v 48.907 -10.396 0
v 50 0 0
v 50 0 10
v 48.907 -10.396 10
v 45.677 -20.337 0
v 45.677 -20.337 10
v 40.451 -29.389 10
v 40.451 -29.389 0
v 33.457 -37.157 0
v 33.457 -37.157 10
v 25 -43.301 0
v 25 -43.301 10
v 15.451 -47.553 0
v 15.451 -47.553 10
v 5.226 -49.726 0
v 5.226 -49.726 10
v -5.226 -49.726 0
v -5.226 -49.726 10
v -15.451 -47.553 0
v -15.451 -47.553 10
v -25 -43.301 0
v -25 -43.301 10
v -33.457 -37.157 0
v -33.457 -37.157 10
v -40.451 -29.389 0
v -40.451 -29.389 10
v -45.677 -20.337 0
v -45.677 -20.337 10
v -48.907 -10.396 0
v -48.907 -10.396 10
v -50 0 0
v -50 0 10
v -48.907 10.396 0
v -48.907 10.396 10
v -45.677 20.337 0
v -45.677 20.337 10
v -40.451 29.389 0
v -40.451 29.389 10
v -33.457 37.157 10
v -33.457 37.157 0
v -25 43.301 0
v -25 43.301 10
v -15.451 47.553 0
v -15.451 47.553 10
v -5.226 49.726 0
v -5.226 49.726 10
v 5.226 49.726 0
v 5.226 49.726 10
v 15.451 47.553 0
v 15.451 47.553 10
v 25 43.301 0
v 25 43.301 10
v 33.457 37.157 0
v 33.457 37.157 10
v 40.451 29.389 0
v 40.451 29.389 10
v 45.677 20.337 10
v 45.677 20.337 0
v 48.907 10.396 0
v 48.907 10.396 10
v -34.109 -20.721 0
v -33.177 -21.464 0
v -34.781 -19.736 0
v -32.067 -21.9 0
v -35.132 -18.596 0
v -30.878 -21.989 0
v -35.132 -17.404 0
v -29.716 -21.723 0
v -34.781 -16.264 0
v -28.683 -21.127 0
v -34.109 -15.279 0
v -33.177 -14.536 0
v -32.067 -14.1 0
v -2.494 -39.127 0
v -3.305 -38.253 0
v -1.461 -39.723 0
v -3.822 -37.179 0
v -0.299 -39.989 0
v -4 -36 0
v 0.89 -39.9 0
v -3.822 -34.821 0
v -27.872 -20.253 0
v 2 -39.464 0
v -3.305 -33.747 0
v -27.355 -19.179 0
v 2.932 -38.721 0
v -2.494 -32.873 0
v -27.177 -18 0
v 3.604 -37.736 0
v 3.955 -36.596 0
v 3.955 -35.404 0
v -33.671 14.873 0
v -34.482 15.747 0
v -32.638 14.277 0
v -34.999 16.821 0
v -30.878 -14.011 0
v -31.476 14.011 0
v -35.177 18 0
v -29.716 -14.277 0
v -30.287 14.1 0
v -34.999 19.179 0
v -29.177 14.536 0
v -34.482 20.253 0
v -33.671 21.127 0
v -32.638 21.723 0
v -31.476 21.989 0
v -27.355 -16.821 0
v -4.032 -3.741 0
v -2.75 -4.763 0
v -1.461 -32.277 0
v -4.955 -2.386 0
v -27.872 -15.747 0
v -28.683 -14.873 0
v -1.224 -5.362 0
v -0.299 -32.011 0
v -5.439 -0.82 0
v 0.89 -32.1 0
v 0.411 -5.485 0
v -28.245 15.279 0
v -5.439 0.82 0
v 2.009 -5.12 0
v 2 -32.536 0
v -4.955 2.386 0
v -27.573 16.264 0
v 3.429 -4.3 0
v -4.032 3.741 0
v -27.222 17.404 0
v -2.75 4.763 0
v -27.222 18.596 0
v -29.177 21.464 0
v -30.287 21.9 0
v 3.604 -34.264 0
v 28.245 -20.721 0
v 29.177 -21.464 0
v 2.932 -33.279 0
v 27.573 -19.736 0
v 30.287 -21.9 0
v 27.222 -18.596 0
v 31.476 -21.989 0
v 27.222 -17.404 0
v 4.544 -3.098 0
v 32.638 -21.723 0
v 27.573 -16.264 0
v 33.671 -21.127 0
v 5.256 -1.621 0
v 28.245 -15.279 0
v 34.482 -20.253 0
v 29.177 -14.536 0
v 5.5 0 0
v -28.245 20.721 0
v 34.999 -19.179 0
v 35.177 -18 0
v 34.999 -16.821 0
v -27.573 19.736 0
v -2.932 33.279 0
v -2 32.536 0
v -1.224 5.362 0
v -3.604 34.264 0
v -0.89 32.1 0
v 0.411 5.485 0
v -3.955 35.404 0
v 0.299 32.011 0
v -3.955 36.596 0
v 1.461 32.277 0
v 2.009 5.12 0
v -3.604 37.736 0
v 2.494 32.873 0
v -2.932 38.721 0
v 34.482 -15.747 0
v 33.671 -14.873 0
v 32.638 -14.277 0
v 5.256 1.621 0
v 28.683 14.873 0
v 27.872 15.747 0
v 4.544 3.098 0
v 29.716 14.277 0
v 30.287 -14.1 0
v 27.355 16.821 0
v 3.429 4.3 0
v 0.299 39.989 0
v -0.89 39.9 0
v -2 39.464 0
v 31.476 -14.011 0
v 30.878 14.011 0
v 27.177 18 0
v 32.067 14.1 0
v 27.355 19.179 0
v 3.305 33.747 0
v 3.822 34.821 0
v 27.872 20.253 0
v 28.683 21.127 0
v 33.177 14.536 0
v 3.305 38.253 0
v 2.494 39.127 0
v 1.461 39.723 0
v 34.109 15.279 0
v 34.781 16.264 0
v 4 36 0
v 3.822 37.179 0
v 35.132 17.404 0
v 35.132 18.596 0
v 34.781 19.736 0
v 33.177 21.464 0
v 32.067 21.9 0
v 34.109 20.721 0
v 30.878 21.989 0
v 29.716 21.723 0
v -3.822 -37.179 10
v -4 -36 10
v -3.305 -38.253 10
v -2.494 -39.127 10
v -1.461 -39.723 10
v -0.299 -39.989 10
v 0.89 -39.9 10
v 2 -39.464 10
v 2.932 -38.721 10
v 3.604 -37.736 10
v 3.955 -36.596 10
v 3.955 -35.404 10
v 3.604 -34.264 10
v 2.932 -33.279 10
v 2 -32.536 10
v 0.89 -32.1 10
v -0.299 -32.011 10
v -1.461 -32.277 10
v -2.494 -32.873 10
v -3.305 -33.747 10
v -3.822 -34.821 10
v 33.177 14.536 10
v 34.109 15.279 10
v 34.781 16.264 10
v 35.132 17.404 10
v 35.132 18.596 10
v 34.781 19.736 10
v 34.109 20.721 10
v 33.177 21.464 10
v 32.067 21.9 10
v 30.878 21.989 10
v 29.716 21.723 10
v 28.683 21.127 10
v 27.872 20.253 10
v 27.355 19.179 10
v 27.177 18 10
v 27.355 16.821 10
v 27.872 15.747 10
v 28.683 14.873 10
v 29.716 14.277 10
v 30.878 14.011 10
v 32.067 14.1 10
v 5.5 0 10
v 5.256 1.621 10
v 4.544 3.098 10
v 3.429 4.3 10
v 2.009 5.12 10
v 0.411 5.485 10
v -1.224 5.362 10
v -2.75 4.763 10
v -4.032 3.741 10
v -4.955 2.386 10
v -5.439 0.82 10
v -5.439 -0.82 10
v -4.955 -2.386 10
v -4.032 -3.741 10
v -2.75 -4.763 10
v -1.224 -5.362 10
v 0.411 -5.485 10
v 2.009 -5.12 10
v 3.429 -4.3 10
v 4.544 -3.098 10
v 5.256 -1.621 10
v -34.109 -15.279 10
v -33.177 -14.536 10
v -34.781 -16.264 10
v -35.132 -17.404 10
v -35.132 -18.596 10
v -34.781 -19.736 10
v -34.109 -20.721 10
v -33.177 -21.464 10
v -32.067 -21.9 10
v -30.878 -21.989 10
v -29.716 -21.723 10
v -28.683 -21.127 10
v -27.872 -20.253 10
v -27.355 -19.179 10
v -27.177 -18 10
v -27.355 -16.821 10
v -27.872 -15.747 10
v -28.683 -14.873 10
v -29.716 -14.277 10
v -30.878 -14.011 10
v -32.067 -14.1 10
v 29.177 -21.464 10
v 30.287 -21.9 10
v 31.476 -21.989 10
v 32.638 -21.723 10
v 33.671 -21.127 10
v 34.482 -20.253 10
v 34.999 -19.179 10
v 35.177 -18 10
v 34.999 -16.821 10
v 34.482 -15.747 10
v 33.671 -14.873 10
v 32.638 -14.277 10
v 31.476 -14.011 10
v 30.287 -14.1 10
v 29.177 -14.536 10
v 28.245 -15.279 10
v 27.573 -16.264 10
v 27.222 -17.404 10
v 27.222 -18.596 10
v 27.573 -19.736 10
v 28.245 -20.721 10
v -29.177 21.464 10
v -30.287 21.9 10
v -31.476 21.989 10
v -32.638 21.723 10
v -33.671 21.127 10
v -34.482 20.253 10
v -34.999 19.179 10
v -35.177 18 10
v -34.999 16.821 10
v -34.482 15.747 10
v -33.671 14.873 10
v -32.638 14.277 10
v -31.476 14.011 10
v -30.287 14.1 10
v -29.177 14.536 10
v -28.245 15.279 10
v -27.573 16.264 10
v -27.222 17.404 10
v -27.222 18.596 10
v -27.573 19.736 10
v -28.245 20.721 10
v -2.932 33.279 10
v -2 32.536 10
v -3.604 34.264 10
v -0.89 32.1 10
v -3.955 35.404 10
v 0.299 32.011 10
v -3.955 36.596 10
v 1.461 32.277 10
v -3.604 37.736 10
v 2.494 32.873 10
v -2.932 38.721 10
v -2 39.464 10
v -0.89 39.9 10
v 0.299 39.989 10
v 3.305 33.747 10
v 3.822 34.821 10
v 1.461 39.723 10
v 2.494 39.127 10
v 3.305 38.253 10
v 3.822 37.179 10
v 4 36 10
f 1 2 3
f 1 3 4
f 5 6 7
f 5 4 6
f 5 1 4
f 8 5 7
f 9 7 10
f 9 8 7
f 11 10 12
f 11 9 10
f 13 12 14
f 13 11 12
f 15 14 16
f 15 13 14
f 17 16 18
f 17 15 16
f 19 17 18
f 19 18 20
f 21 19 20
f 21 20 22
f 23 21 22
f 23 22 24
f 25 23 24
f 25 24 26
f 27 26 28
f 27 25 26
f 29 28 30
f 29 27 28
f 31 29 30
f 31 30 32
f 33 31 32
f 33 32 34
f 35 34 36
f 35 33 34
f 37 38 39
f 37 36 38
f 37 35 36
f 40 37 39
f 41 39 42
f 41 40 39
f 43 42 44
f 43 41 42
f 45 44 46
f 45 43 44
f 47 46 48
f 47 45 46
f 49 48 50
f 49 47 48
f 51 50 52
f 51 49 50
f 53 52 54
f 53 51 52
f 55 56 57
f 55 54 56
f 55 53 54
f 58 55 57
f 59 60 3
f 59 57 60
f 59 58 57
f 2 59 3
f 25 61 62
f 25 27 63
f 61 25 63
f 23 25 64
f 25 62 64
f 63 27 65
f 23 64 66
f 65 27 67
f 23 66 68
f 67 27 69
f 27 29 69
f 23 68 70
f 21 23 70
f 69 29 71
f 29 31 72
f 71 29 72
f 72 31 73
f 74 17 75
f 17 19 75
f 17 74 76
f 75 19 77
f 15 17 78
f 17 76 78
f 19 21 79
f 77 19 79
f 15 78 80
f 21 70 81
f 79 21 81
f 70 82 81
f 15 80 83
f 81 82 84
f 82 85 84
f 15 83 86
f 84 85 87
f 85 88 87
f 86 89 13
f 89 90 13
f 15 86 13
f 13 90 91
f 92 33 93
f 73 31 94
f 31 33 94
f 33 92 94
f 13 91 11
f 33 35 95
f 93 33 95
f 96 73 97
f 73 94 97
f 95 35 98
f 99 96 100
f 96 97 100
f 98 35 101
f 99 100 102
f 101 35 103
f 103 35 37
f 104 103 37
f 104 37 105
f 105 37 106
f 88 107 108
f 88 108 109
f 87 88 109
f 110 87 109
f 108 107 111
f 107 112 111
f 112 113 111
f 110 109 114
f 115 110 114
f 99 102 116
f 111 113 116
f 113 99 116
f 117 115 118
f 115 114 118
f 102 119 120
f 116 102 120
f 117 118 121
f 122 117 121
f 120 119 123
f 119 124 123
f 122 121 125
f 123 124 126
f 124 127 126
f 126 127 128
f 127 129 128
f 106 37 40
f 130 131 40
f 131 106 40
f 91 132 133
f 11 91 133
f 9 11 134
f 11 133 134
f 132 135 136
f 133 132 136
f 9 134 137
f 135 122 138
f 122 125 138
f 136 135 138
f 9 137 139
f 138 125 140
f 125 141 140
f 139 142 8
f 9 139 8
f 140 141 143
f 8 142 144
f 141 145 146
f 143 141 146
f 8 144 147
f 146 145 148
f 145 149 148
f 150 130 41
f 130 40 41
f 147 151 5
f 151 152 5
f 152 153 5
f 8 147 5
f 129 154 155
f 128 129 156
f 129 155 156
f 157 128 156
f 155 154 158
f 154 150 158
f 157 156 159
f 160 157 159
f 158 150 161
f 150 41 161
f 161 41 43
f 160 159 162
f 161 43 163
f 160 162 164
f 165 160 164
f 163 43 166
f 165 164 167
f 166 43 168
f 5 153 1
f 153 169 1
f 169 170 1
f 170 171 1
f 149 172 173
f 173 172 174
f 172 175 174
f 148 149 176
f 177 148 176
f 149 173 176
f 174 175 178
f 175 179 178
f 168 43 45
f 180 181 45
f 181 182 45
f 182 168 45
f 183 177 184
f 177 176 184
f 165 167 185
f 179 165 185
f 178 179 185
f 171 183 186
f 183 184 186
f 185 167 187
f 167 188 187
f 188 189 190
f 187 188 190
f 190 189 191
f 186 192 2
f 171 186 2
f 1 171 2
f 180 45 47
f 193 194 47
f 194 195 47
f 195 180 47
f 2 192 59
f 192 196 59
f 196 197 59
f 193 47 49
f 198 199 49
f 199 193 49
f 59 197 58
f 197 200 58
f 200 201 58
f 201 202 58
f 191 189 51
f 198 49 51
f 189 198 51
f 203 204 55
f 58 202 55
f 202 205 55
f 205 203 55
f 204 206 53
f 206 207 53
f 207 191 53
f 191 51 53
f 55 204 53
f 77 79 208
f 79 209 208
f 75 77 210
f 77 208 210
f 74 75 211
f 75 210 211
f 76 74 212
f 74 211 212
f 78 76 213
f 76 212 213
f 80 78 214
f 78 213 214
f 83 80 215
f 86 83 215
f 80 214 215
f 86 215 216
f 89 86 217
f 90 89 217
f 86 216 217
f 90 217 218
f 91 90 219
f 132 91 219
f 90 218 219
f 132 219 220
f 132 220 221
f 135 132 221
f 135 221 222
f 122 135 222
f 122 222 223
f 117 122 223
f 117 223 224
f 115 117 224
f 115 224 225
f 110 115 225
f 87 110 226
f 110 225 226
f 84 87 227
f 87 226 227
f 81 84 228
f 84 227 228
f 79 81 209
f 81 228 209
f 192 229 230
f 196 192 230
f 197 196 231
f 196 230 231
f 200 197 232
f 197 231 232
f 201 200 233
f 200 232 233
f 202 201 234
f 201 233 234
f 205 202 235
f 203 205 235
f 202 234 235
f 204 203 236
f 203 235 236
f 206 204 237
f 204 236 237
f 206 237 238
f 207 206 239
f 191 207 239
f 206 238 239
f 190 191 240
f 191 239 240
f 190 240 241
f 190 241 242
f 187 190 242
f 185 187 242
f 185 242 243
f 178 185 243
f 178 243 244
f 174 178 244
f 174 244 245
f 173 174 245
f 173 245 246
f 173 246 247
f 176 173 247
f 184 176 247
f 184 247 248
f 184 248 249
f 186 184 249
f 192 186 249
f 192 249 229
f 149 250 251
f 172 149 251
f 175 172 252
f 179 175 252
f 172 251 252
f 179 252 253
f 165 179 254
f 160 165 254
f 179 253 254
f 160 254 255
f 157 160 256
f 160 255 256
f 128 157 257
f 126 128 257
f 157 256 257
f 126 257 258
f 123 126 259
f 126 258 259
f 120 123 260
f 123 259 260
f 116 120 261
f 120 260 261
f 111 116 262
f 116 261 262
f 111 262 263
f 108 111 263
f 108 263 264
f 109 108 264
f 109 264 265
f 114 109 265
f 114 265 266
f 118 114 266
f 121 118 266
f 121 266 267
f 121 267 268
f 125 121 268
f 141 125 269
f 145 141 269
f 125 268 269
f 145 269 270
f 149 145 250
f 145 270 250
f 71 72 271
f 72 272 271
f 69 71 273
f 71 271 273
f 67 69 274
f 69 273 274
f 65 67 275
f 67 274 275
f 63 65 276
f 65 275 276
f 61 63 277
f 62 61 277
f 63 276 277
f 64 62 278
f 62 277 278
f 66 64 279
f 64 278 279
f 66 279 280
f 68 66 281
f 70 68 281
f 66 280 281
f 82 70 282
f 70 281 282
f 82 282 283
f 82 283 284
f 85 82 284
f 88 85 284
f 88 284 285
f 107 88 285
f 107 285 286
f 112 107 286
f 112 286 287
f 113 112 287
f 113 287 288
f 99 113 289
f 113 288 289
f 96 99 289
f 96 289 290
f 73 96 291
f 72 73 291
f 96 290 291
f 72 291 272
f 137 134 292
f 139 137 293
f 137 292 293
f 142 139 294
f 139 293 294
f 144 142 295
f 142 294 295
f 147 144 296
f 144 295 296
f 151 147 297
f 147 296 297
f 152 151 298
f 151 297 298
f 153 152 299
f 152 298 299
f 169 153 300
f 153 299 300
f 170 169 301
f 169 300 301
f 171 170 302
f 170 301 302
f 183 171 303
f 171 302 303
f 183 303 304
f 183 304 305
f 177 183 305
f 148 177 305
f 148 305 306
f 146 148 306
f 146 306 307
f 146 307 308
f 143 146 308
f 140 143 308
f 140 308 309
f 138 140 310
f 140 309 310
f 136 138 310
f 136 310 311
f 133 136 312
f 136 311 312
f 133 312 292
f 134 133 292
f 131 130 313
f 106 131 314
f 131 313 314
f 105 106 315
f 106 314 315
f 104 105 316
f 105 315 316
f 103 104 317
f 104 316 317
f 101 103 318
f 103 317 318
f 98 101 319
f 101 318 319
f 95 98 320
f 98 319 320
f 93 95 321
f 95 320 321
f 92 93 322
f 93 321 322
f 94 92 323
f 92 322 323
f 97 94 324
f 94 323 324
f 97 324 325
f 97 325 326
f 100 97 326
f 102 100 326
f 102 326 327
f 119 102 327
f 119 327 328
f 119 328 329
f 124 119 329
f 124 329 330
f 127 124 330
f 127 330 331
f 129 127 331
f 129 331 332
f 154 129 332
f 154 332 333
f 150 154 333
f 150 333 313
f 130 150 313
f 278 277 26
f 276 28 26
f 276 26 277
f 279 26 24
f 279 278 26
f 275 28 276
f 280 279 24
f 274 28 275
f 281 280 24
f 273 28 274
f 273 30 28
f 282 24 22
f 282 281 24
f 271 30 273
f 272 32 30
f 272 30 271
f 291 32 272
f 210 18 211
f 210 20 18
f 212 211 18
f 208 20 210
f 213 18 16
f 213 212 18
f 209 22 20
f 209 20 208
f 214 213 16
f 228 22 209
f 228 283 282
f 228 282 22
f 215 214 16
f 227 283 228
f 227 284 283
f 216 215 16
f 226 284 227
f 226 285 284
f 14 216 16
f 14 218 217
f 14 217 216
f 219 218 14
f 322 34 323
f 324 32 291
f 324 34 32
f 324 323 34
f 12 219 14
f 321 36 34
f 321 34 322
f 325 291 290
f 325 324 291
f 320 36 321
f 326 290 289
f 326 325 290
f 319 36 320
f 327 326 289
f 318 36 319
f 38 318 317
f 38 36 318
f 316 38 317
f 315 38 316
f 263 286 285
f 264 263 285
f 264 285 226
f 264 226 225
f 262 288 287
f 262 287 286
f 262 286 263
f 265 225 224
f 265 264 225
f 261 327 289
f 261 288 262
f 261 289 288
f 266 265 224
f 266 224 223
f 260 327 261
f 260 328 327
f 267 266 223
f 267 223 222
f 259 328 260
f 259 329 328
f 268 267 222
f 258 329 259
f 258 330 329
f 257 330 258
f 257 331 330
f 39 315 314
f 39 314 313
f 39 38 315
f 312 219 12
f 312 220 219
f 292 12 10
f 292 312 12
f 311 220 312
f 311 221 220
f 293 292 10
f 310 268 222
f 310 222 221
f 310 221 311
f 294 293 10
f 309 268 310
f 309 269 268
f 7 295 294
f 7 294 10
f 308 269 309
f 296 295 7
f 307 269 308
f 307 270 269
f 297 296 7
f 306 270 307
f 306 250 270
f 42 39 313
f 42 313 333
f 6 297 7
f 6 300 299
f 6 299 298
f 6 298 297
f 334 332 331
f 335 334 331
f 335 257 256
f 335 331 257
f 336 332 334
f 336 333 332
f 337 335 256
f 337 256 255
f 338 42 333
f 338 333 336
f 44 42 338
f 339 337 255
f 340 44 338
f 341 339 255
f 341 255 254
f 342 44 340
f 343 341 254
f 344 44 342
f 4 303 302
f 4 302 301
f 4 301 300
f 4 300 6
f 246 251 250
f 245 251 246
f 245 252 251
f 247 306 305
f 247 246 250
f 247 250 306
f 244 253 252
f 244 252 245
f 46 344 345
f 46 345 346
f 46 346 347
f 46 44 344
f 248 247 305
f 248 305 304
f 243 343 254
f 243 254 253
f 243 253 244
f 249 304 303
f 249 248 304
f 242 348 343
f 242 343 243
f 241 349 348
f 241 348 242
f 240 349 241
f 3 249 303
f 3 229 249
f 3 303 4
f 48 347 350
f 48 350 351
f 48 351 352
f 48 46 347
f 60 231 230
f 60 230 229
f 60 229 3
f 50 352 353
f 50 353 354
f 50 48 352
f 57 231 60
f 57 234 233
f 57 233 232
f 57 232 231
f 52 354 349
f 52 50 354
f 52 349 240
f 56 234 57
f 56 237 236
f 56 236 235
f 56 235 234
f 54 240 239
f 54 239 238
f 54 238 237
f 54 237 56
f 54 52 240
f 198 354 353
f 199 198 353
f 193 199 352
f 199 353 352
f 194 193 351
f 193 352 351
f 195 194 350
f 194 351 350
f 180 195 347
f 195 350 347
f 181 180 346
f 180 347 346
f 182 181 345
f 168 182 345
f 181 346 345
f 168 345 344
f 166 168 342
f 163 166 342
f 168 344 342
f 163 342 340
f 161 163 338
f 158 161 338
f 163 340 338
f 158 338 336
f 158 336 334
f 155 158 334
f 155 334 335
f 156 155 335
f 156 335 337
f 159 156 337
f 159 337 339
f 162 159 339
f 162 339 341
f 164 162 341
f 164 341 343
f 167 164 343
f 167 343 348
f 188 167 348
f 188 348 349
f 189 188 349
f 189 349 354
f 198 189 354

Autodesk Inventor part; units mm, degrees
ref_plane "YZ Plane" through (0, 0, 0) normal (1, 0, 0) x (0, 1, 0)
ref_plane "XZ Plane" through (0, 0, 0) normal (0, 1, 0) x (-1, 0, 0)
ref_plane "XY Plane" through (0, 0, 0) normal (0, 0, 1) x (1, 0, 0)
sketch "Sketch1" plane through (0, 0, 0) normal (0, 0, 1) x (1, 0, 0)
  point P0 (0, 0)
sketch "Sketch2" plane through (0, 0, 0) normal (0, 0, 1) x (1, 0, 0)
  circle A0 centre (0, 0) radius 50
  dimension "d0" = 100
extrude "Extrusion1" add sketch "Sketch2" along normal blind 10
sketch "Sketch5" plane through (0, 0, 10) normal (0, 0, 1) x (1, 0, 0)
  circle A0 centre (0, 0) radius 12.5 projected
  line L0 (0, 0) -> (0, 36)
  circle A1 centre (0, 36) radius 4
  dimension "d16" = 36
  dimension "d17" = 8
extrude "Extrusion4" cut sketch "Sketch5" against normal blind 10 contours A1
sketch "Sketch7" plane through (0, 0, 10) normal (0, 0, 1) x (1, 0, 0)
  circle A0 centre (0, 0) radius 5.5
  dimension "d26" = 11
extrude "Extrusion6" cut sketch "Sketch7" against normal blind 10
pattern_circular "Circular Pattern2" count 6 over 360 about axis through (0, 0, 10) along (0, 0, -1) of "Extrusion4"
equation "\"BendRadius\" = Thickness"
equation "\"BendReliefWidth\" = Thickness"
equation "\"BendReliefDepth\" = 0.5 * Thickness"
equation "\"CornerReliefSize\" = 4 * Thickness"
equation "\"MinimumRemnant\" = 2 * Thickness"
equation "\"TransitionRadius\" = BendRadius"
equation "\"JacobiRadiusSize\" = BendRadius"
equation "\"GapSize\" = Thickness"
equation "\"Thickness\" = 3.048"
properties part number "capp"
